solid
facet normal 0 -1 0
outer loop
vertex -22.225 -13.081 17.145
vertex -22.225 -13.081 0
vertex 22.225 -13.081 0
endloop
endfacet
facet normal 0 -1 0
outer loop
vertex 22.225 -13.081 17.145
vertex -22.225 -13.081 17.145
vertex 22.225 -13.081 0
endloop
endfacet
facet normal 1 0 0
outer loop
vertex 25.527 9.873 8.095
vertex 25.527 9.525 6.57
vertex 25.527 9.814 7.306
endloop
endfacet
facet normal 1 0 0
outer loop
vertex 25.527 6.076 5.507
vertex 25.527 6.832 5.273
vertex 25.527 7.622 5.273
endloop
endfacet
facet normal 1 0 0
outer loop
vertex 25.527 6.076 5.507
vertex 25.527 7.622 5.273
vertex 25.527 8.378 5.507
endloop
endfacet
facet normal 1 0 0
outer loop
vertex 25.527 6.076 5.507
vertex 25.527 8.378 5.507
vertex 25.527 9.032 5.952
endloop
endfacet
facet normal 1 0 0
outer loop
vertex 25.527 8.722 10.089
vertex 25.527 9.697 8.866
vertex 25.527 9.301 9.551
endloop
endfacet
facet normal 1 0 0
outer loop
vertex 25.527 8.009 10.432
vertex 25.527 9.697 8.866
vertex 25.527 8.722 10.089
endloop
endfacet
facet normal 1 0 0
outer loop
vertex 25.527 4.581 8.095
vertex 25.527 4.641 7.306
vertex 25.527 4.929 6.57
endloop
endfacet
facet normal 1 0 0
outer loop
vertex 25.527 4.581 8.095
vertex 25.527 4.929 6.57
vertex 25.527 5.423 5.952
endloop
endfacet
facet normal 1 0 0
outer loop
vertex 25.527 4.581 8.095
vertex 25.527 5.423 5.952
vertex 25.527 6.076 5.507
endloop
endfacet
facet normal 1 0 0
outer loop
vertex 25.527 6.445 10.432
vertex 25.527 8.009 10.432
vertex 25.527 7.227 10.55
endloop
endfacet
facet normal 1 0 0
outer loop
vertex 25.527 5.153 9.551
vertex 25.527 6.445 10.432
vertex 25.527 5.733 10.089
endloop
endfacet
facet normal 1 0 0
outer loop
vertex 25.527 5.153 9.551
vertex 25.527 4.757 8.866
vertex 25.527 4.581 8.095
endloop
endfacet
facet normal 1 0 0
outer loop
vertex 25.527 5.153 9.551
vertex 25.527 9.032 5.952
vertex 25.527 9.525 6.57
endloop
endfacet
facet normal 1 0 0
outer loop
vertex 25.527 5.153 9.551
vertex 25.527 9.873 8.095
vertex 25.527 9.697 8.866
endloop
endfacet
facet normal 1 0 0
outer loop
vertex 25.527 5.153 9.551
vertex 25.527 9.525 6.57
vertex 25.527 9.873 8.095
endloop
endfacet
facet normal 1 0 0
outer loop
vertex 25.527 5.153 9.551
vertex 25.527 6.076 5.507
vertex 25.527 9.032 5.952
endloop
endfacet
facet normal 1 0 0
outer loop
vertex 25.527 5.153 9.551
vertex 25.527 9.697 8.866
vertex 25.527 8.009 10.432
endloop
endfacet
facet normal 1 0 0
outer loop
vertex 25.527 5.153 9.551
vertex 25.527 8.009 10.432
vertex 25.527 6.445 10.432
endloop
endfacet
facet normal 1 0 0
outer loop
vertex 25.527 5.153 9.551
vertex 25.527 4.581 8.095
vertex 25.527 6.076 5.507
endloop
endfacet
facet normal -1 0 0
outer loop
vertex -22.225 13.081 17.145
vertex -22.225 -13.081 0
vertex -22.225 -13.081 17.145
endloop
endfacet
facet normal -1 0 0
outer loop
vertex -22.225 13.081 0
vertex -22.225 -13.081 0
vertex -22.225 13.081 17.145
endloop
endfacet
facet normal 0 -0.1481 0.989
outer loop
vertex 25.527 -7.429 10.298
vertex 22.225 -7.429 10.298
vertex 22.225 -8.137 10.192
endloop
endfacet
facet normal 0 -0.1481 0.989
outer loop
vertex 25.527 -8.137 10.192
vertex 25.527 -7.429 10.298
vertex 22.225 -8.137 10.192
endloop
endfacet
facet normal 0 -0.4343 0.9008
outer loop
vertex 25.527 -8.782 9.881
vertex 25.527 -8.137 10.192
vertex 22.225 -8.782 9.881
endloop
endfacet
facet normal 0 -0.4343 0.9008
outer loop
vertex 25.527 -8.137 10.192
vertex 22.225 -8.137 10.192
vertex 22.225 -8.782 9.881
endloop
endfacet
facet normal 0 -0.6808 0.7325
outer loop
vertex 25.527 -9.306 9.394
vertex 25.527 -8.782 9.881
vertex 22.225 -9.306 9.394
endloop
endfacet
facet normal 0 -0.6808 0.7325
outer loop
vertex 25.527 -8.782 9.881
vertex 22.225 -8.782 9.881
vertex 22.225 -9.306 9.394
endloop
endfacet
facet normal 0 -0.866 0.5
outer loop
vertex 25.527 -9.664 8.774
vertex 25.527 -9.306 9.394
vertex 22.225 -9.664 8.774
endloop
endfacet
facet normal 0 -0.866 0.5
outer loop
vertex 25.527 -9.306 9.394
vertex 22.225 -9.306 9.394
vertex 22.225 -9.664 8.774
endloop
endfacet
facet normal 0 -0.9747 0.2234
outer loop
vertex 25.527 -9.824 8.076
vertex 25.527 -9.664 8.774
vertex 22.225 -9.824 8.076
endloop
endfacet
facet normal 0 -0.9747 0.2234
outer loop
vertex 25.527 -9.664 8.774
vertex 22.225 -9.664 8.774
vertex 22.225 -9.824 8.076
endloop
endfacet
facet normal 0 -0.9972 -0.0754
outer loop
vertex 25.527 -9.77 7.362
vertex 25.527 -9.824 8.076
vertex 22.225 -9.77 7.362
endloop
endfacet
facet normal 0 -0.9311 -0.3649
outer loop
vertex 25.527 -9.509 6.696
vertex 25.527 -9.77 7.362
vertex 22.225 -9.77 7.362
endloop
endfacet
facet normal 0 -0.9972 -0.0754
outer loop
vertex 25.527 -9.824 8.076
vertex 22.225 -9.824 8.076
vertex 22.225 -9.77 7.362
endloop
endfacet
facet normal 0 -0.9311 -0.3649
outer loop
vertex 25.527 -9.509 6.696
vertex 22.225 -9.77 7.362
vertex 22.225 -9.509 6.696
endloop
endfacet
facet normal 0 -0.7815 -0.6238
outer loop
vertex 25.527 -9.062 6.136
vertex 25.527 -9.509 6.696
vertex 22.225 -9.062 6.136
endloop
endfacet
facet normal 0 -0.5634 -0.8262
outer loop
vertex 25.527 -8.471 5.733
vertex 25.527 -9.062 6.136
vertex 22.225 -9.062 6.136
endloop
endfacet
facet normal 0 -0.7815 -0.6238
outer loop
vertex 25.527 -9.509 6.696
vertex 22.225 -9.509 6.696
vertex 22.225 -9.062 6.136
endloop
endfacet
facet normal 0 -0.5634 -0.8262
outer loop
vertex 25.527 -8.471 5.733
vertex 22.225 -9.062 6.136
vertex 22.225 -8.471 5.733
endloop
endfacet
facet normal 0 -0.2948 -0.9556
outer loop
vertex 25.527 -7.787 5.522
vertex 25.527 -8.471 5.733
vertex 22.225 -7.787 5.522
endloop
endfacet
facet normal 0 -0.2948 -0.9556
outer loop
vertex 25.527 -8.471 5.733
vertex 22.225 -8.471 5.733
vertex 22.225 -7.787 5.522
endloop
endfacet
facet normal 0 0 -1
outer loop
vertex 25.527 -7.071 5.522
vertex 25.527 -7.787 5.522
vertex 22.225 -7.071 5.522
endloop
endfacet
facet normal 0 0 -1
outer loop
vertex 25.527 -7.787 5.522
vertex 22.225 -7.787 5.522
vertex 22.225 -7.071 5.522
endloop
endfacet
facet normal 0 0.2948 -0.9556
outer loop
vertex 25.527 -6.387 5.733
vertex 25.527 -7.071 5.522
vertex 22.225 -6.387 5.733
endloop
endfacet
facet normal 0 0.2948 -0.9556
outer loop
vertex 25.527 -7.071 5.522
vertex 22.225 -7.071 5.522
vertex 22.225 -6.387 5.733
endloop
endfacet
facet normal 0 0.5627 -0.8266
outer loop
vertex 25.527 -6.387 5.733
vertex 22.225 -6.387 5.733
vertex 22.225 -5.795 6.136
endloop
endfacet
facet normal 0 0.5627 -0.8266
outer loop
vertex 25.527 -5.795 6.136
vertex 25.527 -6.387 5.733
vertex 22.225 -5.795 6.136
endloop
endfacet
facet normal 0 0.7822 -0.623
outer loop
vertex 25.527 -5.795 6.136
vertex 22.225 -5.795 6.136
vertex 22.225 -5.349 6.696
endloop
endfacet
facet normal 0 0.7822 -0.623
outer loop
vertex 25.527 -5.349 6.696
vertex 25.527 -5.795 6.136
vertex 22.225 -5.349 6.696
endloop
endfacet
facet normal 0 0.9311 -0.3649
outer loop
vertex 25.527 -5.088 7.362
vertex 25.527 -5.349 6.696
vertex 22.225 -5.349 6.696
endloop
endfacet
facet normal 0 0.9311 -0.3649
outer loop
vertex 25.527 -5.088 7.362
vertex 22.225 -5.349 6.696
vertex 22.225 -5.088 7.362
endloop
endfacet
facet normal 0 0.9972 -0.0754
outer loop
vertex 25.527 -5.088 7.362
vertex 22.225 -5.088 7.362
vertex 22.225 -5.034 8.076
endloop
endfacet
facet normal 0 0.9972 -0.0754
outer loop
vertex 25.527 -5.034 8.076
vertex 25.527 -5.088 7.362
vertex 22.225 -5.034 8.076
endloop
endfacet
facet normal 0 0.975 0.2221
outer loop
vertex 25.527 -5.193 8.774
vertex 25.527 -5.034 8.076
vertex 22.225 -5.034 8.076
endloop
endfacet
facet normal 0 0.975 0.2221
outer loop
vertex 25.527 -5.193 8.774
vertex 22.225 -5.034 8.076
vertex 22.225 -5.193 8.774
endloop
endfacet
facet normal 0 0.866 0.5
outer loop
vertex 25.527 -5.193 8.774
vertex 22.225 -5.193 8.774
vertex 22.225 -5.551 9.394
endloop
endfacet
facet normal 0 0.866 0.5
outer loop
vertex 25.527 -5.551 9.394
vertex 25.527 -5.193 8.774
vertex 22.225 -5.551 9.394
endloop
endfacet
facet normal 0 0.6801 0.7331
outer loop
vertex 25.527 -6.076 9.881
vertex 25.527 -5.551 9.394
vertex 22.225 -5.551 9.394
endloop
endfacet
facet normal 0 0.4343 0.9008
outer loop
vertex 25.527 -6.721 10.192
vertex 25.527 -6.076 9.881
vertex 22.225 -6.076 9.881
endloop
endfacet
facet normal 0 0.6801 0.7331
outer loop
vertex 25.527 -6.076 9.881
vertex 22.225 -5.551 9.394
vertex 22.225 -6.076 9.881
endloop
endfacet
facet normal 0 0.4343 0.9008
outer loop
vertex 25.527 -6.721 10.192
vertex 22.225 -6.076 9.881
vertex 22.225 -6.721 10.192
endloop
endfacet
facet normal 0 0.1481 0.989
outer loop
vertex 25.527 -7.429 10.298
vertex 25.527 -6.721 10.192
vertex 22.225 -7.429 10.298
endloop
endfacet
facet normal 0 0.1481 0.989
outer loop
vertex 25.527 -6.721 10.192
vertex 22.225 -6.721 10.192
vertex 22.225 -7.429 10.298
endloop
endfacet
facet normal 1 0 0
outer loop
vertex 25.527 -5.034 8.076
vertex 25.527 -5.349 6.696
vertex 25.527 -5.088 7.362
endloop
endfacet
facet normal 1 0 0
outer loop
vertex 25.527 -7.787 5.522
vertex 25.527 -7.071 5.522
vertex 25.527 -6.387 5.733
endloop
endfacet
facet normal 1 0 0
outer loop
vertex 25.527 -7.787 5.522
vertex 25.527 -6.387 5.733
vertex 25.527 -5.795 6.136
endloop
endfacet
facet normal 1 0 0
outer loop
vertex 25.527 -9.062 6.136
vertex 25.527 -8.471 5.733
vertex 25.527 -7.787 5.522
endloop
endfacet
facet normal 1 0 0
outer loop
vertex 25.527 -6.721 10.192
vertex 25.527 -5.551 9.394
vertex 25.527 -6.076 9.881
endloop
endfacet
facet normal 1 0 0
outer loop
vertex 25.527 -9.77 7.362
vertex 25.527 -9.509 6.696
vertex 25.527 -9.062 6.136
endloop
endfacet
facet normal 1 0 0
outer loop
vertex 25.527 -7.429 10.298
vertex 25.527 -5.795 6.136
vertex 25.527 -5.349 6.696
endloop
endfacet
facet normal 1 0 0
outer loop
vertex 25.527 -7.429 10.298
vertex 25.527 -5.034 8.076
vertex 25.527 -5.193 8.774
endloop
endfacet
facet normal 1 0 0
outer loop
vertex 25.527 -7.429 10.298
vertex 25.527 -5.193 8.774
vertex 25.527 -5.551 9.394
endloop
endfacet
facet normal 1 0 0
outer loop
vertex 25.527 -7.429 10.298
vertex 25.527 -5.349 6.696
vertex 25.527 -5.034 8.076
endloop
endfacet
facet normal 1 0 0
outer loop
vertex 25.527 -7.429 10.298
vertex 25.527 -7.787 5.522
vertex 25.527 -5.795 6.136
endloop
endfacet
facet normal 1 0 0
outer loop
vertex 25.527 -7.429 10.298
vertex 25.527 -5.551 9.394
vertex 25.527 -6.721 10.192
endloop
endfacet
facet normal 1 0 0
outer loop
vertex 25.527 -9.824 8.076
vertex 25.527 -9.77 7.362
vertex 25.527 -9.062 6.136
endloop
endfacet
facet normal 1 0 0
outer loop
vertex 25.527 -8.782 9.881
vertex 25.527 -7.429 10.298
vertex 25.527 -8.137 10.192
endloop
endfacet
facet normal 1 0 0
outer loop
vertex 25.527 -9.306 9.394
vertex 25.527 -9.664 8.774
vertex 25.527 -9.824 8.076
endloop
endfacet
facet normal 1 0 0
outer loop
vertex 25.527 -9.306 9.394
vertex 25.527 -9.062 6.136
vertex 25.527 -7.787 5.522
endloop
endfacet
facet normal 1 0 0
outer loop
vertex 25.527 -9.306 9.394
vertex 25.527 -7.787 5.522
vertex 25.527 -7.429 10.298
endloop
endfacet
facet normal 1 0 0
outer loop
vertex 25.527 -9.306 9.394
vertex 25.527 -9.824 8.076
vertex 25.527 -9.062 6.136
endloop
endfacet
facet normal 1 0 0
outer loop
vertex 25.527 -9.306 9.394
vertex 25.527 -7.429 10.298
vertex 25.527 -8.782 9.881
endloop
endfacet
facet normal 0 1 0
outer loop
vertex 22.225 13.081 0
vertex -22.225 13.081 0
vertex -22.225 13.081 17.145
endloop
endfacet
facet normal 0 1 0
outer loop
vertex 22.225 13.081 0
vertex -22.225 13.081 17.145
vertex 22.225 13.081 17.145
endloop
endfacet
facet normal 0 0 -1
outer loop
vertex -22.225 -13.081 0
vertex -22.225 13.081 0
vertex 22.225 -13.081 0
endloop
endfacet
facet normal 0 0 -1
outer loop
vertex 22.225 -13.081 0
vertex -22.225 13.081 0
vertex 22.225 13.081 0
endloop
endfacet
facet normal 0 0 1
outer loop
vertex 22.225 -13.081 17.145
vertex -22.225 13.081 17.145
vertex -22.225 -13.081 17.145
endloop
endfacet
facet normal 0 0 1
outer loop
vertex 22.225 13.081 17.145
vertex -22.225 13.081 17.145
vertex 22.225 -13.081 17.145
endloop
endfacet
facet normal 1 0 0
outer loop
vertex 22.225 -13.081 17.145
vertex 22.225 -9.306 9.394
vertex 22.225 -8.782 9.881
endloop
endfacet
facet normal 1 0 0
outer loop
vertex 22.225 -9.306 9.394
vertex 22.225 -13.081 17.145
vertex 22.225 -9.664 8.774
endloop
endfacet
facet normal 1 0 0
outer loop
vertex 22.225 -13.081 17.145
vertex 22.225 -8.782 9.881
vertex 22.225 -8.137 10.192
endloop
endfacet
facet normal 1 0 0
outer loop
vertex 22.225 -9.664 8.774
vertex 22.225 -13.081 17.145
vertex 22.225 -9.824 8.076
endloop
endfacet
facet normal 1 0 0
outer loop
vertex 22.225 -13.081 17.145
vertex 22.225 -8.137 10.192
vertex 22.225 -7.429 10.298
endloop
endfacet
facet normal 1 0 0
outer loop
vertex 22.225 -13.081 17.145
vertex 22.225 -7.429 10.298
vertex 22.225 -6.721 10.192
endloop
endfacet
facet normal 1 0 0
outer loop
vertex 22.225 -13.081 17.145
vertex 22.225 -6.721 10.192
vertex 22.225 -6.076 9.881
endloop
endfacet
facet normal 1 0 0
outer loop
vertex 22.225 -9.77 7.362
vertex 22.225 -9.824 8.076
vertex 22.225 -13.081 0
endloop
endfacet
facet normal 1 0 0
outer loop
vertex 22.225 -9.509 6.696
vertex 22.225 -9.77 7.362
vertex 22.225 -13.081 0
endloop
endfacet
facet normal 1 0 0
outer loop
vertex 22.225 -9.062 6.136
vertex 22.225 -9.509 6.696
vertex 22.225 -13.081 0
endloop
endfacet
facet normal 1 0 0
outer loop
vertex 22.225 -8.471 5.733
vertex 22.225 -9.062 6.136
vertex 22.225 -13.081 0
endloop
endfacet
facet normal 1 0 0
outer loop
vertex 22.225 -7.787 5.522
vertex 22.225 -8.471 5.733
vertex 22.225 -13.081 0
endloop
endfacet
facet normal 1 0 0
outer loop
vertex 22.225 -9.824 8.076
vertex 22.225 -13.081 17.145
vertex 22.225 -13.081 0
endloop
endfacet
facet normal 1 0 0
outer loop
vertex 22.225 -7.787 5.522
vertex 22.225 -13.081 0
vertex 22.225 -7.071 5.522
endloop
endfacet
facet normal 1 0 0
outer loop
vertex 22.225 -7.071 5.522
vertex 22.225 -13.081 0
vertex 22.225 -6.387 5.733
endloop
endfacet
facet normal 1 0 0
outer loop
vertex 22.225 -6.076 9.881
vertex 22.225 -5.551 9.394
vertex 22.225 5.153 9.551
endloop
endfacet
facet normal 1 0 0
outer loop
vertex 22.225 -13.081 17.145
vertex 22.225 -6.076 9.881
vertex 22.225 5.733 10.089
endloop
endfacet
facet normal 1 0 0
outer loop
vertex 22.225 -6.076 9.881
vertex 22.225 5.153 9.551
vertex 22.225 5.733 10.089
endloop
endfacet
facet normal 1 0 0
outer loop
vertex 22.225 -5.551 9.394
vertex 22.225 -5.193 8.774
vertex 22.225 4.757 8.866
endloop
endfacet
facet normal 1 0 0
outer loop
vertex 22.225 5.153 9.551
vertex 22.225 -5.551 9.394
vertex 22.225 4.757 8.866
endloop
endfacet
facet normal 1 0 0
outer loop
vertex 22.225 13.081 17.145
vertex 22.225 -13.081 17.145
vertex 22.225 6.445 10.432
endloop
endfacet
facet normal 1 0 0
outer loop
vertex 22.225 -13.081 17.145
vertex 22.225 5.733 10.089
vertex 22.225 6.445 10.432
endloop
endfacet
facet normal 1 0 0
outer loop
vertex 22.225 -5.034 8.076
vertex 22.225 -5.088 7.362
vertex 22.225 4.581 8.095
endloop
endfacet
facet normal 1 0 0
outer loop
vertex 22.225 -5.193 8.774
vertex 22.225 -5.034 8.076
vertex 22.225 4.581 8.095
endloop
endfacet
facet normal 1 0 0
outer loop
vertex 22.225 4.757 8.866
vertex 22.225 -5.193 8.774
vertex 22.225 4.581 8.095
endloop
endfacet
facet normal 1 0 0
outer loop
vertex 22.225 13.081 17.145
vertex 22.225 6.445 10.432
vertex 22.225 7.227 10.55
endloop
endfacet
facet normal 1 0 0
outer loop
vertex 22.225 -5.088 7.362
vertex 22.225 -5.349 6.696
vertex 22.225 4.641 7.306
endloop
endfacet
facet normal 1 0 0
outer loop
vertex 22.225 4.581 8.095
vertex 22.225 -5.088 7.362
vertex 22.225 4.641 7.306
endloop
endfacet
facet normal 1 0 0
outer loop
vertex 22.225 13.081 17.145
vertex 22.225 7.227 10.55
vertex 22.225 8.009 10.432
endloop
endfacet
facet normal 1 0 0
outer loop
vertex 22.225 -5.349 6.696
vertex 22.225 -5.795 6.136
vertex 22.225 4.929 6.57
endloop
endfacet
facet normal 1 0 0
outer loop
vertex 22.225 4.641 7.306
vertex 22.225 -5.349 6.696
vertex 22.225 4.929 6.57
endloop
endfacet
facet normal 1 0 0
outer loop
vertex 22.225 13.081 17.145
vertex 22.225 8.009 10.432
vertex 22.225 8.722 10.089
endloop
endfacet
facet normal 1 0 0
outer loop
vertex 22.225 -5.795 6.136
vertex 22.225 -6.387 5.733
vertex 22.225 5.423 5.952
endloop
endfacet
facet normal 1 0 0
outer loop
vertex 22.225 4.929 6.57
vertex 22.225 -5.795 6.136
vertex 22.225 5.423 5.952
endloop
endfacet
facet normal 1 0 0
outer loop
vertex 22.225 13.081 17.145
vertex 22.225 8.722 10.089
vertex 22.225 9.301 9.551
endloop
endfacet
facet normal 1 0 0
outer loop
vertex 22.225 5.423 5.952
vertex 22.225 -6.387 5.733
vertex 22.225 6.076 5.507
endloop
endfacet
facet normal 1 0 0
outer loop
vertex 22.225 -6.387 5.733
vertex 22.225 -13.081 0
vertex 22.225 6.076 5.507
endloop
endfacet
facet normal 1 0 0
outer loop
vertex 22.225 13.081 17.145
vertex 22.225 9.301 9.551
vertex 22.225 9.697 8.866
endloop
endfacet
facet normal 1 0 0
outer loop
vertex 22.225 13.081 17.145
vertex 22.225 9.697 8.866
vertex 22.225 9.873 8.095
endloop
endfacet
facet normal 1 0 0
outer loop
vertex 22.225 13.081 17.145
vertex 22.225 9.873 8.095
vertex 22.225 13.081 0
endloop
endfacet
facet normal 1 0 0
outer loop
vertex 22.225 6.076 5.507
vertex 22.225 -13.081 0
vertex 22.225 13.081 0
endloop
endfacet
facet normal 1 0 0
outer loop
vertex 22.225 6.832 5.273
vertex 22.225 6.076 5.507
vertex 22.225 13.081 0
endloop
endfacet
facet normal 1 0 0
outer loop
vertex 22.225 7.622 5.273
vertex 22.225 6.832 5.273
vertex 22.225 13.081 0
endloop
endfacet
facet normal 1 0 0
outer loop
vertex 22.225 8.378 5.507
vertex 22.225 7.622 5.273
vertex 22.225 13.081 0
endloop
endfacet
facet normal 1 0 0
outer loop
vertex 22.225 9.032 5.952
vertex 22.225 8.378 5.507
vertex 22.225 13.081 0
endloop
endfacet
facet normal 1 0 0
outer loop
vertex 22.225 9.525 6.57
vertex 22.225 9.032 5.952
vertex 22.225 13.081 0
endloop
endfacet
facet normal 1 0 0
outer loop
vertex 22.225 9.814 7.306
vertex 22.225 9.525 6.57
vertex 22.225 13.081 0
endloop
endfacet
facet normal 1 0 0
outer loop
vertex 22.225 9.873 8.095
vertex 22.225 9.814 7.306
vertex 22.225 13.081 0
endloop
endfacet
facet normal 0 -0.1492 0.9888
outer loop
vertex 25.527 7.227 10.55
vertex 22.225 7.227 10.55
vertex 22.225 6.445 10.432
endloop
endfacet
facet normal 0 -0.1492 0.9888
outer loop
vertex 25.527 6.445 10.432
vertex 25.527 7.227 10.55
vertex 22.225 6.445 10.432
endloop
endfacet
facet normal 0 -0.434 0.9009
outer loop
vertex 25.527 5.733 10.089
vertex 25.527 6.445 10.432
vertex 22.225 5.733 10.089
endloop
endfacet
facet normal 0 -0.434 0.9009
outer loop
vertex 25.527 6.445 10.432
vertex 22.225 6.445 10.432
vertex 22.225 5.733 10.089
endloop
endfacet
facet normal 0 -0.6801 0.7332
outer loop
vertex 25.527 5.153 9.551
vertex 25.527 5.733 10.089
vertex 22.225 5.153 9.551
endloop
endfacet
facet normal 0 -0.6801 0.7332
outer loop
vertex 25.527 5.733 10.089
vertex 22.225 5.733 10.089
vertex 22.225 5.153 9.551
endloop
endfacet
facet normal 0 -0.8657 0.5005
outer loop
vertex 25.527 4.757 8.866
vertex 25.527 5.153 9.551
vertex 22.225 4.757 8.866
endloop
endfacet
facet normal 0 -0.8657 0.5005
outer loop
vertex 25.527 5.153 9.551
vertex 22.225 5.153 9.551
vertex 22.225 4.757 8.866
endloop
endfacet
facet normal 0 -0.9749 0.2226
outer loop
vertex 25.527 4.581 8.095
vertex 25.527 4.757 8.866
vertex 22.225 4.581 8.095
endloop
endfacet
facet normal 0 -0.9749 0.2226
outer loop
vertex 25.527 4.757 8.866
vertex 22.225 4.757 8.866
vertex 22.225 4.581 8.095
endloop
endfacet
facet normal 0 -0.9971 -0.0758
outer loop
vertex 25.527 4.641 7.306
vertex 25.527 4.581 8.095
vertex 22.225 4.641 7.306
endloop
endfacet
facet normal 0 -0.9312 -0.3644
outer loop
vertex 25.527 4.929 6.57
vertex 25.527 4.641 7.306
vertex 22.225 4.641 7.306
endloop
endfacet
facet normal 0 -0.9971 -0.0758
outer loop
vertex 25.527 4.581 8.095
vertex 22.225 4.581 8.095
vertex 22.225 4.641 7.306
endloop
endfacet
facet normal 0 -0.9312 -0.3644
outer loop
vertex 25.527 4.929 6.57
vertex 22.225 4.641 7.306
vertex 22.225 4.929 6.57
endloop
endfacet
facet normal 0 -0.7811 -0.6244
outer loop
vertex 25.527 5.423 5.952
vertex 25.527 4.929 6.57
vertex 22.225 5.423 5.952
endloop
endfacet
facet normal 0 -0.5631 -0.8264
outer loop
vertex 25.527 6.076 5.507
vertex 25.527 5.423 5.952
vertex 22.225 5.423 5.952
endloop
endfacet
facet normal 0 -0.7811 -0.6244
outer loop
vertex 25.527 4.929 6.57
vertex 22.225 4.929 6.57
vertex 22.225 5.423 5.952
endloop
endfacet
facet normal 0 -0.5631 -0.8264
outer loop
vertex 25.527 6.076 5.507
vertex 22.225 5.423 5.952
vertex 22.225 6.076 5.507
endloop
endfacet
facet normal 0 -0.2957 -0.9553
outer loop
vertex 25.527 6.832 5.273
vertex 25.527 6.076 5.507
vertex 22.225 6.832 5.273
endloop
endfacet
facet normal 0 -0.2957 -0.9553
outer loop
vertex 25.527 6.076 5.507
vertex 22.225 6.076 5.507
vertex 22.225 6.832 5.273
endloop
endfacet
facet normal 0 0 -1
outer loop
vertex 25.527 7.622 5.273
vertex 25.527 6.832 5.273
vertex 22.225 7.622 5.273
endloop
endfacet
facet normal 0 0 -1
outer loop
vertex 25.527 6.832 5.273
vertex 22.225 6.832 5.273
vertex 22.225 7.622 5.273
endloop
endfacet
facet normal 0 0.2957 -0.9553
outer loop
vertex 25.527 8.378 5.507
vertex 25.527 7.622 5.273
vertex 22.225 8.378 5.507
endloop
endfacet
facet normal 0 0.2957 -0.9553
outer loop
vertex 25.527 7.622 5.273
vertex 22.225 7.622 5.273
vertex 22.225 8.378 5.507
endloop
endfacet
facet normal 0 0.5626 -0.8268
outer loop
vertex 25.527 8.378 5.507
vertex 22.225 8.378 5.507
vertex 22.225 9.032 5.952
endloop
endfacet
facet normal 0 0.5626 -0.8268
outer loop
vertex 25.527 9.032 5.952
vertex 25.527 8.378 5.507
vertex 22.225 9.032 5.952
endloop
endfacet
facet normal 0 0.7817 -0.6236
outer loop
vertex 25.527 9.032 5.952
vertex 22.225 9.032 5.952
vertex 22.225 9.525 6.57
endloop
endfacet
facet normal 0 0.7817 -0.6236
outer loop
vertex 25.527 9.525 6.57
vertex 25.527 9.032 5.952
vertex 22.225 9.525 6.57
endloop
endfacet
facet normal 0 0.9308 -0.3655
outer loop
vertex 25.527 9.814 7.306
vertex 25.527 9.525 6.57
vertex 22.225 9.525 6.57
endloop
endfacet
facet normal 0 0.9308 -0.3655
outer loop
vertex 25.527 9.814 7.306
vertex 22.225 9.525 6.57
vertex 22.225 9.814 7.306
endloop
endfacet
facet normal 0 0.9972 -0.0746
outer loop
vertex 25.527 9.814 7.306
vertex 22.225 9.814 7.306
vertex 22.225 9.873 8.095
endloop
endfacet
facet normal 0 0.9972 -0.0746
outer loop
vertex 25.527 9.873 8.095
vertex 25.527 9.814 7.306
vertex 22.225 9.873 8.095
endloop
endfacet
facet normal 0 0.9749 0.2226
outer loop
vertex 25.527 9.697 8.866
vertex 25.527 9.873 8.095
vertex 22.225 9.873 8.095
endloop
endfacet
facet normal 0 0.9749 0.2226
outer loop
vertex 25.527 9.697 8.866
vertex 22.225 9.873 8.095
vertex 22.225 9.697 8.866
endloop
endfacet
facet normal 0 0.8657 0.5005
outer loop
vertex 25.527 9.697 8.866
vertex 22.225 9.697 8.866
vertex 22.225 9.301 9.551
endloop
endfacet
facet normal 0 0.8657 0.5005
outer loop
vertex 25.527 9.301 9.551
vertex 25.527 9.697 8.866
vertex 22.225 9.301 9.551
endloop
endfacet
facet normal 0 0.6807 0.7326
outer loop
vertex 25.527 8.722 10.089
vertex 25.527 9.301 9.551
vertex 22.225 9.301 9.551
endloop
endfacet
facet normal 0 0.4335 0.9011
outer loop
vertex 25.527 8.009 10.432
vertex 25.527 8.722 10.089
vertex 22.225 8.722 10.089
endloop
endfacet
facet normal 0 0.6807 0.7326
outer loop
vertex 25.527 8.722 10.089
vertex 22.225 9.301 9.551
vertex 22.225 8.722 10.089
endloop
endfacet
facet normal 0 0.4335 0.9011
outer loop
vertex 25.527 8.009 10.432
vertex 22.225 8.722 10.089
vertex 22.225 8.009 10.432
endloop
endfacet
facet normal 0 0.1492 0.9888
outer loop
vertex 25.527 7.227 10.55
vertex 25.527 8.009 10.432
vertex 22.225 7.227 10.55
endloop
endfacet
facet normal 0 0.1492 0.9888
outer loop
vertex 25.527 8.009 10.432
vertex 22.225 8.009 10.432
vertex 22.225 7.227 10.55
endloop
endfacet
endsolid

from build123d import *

# Parameters (mm, degrees)
SKETCH1_W           = 44.45
SKETCH1_H           = 26.162
BOSS_EXTRUDE1_DEPTH = 17.145
SKETCH2_R           = 2.653013258
SKETCH2_R_2         = 2.40141023
BOSS_EXTRUDE2_DEPTH = 3.302


with BuildPart() as part:
    # Sketch1 → Boss-Extrude1 (new body)
    with BuildSketch(Plane.XY):
        Rectangle(SKETCH1_W, SKETCH1_H)
    extrude(amount=BOSS_EXTRUDE1_DEPTH)

    # Sketch2 → Boss-Extrude2 (add)
    with BuildSketch(Plane(origin=(22.225, 0, 0), x_dir=(0, 0, -1), z_dir=(1, 0, 0))):
        with Locations(Location((-7.896848557, 7.227034624, 0), (0, 0, 180))):
            Circle(SKETCH2_R)
        with Locations(Location((-7.896848557, -7.428836292, 0), (0, 0, 180))):
            Circle(SKETCH2_R_2)
    extrude(amount=BOSS_EXTRUDE2_DEPTH)


solid = part.part
